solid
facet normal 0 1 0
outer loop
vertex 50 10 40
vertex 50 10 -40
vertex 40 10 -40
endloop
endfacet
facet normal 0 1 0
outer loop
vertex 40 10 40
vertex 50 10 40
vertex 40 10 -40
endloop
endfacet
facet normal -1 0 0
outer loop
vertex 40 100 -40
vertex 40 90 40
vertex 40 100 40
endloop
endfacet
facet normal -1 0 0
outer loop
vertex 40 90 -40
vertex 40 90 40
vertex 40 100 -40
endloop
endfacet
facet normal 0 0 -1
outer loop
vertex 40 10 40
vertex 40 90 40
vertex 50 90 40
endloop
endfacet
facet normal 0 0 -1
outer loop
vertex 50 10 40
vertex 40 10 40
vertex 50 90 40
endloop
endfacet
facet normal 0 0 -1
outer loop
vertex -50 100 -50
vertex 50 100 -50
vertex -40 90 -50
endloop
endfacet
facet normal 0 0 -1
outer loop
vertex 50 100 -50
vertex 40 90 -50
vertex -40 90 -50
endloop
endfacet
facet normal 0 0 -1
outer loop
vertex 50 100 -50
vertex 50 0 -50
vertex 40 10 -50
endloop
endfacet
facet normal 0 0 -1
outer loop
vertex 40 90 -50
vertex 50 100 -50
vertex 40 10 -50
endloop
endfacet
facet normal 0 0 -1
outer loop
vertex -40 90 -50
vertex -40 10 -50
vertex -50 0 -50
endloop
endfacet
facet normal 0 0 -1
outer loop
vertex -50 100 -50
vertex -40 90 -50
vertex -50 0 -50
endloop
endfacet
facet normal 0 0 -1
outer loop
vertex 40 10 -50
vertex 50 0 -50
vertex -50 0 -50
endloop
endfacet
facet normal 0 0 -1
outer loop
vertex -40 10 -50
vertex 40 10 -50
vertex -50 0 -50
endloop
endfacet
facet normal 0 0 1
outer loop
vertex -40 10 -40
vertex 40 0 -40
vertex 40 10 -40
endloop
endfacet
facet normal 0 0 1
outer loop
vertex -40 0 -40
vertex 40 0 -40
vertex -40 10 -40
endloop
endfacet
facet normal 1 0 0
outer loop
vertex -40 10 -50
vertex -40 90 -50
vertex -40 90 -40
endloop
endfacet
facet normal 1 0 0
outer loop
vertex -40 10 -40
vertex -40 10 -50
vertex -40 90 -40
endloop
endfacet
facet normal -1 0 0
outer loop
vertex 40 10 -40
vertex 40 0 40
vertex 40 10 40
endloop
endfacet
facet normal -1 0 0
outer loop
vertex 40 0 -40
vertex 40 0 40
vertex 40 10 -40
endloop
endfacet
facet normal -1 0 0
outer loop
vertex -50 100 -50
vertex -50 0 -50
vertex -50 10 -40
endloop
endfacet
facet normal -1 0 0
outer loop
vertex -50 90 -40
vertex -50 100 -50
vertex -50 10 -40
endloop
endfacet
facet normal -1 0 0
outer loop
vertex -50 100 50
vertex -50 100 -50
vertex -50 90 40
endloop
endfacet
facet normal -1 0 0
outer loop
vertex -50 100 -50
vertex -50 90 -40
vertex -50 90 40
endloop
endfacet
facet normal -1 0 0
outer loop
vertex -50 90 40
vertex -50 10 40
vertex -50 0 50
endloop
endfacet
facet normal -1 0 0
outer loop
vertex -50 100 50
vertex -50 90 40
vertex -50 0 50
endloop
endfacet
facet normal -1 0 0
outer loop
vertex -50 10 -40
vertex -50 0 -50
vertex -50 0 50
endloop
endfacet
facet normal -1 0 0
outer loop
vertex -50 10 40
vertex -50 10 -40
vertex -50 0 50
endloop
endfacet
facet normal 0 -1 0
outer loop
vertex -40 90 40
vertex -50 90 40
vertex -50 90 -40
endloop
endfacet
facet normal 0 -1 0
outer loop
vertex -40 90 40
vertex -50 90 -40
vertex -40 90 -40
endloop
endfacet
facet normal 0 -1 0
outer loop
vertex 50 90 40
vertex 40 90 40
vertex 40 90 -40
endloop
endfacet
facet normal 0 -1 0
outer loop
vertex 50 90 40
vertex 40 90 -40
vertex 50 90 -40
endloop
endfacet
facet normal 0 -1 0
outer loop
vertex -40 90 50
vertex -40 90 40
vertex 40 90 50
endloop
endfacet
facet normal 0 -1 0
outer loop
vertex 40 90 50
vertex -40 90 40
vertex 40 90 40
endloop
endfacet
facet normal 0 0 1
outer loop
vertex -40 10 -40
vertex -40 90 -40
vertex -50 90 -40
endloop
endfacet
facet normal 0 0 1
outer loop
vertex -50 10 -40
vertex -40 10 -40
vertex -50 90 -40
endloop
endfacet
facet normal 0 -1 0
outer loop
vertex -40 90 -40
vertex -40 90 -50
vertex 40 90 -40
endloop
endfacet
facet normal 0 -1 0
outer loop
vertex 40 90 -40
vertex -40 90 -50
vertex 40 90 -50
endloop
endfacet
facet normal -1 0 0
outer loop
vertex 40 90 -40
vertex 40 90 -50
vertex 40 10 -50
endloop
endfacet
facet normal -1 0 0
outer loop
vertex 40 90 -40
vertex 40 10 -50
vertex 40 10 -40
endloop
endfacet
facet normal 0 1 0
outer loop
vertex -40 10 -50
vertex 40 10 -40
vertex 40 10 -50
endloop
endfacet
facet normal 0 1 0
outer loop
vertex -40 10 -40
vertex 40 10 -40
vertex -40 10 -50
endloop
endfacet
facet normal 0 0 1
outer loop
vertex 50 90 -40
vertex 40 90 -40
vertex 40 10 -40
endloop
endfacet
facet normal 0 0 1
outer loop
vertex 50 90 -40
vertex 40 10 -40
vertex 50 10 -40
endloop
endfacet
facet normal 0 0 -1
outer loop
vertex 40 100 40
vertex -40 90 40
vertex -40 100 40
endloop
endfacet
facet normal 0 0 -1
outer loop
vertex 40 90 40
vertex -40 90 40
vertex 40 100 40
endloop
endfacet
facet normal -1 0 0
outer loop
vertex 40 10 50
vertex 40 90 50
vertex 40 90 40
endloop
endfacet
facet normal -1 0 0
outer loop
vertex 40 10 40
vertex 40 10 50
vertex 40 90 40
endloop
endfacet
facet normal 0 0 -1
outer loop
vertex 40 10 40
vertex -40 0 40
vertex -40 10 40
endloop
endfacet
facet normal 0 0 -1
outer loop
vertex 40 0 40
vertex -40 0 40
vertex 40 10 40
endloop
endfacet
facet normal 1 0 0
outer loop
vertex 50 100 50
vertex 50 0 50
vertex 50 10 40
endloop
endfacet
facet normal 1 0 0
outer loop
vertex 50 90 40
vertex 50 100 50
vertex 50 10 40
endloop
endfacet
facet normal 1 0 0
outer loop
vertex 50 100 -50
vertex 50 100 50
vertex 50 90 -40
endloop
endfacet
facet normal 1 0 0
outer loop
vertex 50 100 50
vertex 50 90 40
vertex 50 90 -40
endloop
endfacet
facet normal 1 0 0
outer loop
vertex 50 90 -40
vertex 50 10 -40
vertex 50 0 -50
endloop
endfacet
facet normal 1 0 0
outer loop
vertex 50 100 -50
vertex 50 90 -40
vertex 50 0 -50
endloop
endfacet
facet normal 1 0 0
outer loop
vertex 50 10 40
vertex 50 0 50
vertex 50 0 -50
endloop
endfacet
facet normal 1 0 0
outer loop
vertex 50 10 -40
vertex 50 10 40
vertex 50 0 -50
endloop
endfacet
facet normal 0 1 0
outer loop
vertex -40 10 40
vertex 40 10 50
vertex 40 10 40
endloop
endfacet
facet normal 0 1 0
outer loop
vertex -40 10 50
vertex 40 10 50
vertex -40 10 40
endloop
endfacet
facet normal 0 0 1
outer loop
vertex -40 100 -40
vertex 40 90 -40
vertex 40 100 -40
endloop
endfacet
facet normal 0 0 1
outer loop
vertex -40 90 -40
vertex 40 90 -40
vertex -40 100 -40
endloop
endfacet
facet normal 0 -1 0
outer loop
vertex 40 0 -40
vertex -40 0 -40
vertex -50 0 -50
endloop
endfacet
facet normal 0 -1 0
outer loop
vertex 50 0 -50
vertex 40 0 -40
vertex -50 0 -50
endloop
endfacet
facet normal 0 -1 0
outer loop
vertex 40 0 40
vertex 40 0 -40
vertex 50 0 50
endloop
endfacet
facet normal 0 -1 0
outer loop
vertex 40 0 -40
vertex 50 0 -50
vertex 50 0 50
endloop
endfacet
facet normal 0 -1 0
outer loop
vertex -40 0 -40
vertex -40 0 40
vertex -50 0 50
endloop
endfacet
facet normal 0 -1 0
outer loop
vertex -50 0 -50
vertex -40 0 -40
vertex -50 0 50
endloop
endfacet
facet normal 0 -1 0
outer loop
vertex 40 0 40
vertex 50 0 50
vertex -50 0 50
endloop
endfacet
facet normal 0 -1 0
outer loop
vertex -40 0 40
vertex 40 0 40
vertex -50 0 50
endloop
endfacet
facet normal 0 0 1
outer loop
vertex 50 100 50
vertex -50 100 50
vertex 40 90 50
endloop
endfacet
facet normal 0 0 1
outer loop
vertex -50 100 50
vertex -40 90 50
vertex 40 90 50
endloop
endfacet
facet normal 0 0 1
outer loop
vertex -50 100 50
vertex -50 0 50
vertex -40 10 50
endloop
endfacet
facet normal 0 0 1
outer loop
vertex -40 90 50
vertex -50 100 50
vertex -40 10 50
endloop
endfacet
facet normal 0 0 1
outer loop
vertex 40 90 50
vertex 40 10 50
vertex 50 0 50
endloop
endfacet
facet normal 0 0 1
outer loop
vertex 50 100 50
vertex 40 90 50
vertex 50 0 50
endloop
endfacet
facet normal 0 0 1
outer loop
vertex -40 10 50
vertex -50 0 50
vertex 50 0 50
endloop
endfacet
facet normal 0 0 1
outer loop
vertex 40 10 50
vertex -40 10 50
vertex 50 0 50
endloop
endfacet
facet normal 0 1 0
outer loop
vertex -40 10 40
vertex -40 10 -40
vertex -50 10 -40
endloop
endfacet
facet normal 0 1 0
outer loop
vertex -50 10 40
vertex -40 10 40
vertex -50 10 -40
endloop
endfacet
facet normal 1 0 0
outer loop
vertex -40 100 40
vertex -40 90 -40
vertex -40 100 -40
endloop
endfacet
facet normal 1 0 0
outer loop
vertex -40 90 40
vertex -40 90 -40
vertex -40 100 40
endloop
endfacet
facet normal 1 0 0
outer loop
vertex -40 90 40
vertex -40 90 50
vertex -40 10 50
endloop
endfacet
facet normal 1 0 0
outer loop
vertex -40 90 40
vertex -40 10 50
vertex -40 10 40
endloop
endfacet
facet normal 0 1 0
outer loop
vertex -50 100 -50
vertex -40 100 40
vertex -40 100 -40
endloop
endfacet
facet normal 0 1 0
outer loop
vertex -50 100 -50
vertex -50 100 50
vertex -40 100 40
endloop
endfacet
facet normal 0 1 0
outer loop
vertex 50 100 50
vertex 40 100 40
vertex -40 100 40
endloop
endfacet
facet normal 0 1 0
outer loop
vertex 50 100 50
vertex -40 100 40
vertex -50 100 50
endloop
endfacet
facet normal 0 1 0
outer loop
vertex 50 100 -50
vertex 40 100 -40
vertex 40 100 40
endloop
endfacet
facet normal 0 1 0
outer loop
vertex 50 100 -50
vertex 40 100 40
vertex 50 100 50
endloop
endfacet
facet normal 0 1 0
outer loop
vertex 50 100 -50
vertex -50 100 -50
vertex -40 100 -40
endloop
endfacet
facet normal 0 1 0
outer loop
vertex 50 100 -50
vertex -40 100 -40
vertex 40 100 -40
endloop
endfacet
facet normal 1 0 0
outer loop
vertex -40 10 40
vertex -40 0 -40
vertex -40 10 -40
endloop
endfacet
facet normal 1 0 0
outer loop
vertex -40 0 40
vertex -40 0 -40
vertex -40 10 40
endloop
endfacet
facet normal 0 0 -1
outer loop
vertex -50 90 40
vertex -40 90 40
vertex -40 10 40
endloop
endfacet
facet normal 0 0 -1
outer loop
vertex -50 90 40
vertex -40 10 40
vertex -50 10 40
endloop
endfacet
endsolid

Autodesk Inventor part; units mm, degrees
ref_plane "YZ Plane" through (0, 0, 0) normal (1, 0, 0) x (0, 1, 0)
ref_plane "XZ Plane" through (0, 0, 0) normal (0, 1, 0) x (-1, 0, 0)
ref_plane "XY Plane" through (0, 0, 0) normal (0, 0, 1) x (1, 0, 0)
sketch "Sketch1" plane through (0, 0, 0) normal (0, 1, 0) x (-1, 0, 0)
  line L0 (50, 50) -> (-50, 50)
  line L1 (-50, 50) -> (-50, -50)
  line L2 (-50, -50) -> (50, -50)
  line L3 (50, -50) -> (50, 50)
  line L4 (50, 50) -> (-50, -50) construction
  line L5 (-50, 50) -> (50, -50) construction
  line L6 (40, 40) -> (-40, 40)
  line L7 (-40, 40) -> (-40, -40)
  line L8 (-40, -40) -> (40, -40)
  line L9 (40, -40) -> (40, 40)
  line L10 (40, 40) -> (-40, -40) construction
  line L11 (-40, 40) -> (40, -40) construction
  point P0 (0, 0)
  dimension "d0" = 100
  dimension "d1" = 100
  dimension "d2" = 80
  dimension "d3" = 80
extrude "Extrusion1" add sketch "Sketch1" along normal blind 10
sketch "Sketch2" plane through (0, 10, 0) normal (0, 1, 0) x (1, 0, 0)
  line L0 (40, -40) -> (50, -40)
  line L1 (50, -40) -> (50, -50)
  line L2 (50, -50) -> (40, -50)
  line L3 (40, -50) -> (40, -40)
  line L4 (40, 40) -> (40, -40) projected
  line L5 (50, 50) -> (-50, 50) projected
  line L6 (40, 40) -> (50, 40)
  line L7 (50, 40) -> (50, 50)
  line L8 (50, 50) -> (40, 50)
  line L9 (40, 50) -> (40, 40)
  line L10 (-40, -40) -> (-40, 40) projected
  line L11 (-50, 50) -> (-50, -50) projected
  line L12 (-40, 40) -> (-50, 40)
  line L13 (-50, 40) -> (-50, 50)
  line L14 (-50, 50) -> (-40, 50)
  line L15 (-40, 50) -> (-40, 40)
  line L16 (40, -40) -> (-40, -40) projected
  line L17 (-40, -40) -> (-50, -40)
  line L18 (-50, -40) -> (-50, -50)
  line L19 (-50, -50) -> (-40, -50)
  line L20 (-40, -50) -> (-40, -40)
  point P0 (0, 0)
extrude "Extrusion2" add sketch "Sketch2" along normal blind 80 contours L0 L1 L2 L3 | L9 L5 L7 L6 | L20 L19 L11 L17 | L12 L11 L5 L15
sketch "Sketch3" plane through (0, 90, 0) normal (0, 1, 0) x (1, 0, 0)
  line L0 (-50, -50) -> (50, -50)
  line L1 (50, -50) -> (50, 50)
  line L2 (50, 50) -> (-50, 50)
  line L3 (-50, 50) -> (-50, -50)
  line L4 (-50, -50) -> (50, 50) construction
  line L5 (50, -50) -> (-50, 50) construction
  line L6 (-40, -40) -> (40, -40)
  line L7 (40, -40) -> (40, 40)
  line L8 (40, 40) -> (-40, 40)
  line L9 (-40, 40) -> (-40, -40)
  line L10 (-40, -40) -> (40, 40) construction
  line L11 (40, -40) -> (-40, 40) construction
  point P0 (0, 0)
  dimension "d8" = 100
  dimension "d9" = 100
  dimension "d10" = 80
  dimension "d11" = 80
extrude "Extrusion3" add sketch "Sketch3" along normal blind 10
properties part number "Hollow_Cube" material "ABS Plastic"
